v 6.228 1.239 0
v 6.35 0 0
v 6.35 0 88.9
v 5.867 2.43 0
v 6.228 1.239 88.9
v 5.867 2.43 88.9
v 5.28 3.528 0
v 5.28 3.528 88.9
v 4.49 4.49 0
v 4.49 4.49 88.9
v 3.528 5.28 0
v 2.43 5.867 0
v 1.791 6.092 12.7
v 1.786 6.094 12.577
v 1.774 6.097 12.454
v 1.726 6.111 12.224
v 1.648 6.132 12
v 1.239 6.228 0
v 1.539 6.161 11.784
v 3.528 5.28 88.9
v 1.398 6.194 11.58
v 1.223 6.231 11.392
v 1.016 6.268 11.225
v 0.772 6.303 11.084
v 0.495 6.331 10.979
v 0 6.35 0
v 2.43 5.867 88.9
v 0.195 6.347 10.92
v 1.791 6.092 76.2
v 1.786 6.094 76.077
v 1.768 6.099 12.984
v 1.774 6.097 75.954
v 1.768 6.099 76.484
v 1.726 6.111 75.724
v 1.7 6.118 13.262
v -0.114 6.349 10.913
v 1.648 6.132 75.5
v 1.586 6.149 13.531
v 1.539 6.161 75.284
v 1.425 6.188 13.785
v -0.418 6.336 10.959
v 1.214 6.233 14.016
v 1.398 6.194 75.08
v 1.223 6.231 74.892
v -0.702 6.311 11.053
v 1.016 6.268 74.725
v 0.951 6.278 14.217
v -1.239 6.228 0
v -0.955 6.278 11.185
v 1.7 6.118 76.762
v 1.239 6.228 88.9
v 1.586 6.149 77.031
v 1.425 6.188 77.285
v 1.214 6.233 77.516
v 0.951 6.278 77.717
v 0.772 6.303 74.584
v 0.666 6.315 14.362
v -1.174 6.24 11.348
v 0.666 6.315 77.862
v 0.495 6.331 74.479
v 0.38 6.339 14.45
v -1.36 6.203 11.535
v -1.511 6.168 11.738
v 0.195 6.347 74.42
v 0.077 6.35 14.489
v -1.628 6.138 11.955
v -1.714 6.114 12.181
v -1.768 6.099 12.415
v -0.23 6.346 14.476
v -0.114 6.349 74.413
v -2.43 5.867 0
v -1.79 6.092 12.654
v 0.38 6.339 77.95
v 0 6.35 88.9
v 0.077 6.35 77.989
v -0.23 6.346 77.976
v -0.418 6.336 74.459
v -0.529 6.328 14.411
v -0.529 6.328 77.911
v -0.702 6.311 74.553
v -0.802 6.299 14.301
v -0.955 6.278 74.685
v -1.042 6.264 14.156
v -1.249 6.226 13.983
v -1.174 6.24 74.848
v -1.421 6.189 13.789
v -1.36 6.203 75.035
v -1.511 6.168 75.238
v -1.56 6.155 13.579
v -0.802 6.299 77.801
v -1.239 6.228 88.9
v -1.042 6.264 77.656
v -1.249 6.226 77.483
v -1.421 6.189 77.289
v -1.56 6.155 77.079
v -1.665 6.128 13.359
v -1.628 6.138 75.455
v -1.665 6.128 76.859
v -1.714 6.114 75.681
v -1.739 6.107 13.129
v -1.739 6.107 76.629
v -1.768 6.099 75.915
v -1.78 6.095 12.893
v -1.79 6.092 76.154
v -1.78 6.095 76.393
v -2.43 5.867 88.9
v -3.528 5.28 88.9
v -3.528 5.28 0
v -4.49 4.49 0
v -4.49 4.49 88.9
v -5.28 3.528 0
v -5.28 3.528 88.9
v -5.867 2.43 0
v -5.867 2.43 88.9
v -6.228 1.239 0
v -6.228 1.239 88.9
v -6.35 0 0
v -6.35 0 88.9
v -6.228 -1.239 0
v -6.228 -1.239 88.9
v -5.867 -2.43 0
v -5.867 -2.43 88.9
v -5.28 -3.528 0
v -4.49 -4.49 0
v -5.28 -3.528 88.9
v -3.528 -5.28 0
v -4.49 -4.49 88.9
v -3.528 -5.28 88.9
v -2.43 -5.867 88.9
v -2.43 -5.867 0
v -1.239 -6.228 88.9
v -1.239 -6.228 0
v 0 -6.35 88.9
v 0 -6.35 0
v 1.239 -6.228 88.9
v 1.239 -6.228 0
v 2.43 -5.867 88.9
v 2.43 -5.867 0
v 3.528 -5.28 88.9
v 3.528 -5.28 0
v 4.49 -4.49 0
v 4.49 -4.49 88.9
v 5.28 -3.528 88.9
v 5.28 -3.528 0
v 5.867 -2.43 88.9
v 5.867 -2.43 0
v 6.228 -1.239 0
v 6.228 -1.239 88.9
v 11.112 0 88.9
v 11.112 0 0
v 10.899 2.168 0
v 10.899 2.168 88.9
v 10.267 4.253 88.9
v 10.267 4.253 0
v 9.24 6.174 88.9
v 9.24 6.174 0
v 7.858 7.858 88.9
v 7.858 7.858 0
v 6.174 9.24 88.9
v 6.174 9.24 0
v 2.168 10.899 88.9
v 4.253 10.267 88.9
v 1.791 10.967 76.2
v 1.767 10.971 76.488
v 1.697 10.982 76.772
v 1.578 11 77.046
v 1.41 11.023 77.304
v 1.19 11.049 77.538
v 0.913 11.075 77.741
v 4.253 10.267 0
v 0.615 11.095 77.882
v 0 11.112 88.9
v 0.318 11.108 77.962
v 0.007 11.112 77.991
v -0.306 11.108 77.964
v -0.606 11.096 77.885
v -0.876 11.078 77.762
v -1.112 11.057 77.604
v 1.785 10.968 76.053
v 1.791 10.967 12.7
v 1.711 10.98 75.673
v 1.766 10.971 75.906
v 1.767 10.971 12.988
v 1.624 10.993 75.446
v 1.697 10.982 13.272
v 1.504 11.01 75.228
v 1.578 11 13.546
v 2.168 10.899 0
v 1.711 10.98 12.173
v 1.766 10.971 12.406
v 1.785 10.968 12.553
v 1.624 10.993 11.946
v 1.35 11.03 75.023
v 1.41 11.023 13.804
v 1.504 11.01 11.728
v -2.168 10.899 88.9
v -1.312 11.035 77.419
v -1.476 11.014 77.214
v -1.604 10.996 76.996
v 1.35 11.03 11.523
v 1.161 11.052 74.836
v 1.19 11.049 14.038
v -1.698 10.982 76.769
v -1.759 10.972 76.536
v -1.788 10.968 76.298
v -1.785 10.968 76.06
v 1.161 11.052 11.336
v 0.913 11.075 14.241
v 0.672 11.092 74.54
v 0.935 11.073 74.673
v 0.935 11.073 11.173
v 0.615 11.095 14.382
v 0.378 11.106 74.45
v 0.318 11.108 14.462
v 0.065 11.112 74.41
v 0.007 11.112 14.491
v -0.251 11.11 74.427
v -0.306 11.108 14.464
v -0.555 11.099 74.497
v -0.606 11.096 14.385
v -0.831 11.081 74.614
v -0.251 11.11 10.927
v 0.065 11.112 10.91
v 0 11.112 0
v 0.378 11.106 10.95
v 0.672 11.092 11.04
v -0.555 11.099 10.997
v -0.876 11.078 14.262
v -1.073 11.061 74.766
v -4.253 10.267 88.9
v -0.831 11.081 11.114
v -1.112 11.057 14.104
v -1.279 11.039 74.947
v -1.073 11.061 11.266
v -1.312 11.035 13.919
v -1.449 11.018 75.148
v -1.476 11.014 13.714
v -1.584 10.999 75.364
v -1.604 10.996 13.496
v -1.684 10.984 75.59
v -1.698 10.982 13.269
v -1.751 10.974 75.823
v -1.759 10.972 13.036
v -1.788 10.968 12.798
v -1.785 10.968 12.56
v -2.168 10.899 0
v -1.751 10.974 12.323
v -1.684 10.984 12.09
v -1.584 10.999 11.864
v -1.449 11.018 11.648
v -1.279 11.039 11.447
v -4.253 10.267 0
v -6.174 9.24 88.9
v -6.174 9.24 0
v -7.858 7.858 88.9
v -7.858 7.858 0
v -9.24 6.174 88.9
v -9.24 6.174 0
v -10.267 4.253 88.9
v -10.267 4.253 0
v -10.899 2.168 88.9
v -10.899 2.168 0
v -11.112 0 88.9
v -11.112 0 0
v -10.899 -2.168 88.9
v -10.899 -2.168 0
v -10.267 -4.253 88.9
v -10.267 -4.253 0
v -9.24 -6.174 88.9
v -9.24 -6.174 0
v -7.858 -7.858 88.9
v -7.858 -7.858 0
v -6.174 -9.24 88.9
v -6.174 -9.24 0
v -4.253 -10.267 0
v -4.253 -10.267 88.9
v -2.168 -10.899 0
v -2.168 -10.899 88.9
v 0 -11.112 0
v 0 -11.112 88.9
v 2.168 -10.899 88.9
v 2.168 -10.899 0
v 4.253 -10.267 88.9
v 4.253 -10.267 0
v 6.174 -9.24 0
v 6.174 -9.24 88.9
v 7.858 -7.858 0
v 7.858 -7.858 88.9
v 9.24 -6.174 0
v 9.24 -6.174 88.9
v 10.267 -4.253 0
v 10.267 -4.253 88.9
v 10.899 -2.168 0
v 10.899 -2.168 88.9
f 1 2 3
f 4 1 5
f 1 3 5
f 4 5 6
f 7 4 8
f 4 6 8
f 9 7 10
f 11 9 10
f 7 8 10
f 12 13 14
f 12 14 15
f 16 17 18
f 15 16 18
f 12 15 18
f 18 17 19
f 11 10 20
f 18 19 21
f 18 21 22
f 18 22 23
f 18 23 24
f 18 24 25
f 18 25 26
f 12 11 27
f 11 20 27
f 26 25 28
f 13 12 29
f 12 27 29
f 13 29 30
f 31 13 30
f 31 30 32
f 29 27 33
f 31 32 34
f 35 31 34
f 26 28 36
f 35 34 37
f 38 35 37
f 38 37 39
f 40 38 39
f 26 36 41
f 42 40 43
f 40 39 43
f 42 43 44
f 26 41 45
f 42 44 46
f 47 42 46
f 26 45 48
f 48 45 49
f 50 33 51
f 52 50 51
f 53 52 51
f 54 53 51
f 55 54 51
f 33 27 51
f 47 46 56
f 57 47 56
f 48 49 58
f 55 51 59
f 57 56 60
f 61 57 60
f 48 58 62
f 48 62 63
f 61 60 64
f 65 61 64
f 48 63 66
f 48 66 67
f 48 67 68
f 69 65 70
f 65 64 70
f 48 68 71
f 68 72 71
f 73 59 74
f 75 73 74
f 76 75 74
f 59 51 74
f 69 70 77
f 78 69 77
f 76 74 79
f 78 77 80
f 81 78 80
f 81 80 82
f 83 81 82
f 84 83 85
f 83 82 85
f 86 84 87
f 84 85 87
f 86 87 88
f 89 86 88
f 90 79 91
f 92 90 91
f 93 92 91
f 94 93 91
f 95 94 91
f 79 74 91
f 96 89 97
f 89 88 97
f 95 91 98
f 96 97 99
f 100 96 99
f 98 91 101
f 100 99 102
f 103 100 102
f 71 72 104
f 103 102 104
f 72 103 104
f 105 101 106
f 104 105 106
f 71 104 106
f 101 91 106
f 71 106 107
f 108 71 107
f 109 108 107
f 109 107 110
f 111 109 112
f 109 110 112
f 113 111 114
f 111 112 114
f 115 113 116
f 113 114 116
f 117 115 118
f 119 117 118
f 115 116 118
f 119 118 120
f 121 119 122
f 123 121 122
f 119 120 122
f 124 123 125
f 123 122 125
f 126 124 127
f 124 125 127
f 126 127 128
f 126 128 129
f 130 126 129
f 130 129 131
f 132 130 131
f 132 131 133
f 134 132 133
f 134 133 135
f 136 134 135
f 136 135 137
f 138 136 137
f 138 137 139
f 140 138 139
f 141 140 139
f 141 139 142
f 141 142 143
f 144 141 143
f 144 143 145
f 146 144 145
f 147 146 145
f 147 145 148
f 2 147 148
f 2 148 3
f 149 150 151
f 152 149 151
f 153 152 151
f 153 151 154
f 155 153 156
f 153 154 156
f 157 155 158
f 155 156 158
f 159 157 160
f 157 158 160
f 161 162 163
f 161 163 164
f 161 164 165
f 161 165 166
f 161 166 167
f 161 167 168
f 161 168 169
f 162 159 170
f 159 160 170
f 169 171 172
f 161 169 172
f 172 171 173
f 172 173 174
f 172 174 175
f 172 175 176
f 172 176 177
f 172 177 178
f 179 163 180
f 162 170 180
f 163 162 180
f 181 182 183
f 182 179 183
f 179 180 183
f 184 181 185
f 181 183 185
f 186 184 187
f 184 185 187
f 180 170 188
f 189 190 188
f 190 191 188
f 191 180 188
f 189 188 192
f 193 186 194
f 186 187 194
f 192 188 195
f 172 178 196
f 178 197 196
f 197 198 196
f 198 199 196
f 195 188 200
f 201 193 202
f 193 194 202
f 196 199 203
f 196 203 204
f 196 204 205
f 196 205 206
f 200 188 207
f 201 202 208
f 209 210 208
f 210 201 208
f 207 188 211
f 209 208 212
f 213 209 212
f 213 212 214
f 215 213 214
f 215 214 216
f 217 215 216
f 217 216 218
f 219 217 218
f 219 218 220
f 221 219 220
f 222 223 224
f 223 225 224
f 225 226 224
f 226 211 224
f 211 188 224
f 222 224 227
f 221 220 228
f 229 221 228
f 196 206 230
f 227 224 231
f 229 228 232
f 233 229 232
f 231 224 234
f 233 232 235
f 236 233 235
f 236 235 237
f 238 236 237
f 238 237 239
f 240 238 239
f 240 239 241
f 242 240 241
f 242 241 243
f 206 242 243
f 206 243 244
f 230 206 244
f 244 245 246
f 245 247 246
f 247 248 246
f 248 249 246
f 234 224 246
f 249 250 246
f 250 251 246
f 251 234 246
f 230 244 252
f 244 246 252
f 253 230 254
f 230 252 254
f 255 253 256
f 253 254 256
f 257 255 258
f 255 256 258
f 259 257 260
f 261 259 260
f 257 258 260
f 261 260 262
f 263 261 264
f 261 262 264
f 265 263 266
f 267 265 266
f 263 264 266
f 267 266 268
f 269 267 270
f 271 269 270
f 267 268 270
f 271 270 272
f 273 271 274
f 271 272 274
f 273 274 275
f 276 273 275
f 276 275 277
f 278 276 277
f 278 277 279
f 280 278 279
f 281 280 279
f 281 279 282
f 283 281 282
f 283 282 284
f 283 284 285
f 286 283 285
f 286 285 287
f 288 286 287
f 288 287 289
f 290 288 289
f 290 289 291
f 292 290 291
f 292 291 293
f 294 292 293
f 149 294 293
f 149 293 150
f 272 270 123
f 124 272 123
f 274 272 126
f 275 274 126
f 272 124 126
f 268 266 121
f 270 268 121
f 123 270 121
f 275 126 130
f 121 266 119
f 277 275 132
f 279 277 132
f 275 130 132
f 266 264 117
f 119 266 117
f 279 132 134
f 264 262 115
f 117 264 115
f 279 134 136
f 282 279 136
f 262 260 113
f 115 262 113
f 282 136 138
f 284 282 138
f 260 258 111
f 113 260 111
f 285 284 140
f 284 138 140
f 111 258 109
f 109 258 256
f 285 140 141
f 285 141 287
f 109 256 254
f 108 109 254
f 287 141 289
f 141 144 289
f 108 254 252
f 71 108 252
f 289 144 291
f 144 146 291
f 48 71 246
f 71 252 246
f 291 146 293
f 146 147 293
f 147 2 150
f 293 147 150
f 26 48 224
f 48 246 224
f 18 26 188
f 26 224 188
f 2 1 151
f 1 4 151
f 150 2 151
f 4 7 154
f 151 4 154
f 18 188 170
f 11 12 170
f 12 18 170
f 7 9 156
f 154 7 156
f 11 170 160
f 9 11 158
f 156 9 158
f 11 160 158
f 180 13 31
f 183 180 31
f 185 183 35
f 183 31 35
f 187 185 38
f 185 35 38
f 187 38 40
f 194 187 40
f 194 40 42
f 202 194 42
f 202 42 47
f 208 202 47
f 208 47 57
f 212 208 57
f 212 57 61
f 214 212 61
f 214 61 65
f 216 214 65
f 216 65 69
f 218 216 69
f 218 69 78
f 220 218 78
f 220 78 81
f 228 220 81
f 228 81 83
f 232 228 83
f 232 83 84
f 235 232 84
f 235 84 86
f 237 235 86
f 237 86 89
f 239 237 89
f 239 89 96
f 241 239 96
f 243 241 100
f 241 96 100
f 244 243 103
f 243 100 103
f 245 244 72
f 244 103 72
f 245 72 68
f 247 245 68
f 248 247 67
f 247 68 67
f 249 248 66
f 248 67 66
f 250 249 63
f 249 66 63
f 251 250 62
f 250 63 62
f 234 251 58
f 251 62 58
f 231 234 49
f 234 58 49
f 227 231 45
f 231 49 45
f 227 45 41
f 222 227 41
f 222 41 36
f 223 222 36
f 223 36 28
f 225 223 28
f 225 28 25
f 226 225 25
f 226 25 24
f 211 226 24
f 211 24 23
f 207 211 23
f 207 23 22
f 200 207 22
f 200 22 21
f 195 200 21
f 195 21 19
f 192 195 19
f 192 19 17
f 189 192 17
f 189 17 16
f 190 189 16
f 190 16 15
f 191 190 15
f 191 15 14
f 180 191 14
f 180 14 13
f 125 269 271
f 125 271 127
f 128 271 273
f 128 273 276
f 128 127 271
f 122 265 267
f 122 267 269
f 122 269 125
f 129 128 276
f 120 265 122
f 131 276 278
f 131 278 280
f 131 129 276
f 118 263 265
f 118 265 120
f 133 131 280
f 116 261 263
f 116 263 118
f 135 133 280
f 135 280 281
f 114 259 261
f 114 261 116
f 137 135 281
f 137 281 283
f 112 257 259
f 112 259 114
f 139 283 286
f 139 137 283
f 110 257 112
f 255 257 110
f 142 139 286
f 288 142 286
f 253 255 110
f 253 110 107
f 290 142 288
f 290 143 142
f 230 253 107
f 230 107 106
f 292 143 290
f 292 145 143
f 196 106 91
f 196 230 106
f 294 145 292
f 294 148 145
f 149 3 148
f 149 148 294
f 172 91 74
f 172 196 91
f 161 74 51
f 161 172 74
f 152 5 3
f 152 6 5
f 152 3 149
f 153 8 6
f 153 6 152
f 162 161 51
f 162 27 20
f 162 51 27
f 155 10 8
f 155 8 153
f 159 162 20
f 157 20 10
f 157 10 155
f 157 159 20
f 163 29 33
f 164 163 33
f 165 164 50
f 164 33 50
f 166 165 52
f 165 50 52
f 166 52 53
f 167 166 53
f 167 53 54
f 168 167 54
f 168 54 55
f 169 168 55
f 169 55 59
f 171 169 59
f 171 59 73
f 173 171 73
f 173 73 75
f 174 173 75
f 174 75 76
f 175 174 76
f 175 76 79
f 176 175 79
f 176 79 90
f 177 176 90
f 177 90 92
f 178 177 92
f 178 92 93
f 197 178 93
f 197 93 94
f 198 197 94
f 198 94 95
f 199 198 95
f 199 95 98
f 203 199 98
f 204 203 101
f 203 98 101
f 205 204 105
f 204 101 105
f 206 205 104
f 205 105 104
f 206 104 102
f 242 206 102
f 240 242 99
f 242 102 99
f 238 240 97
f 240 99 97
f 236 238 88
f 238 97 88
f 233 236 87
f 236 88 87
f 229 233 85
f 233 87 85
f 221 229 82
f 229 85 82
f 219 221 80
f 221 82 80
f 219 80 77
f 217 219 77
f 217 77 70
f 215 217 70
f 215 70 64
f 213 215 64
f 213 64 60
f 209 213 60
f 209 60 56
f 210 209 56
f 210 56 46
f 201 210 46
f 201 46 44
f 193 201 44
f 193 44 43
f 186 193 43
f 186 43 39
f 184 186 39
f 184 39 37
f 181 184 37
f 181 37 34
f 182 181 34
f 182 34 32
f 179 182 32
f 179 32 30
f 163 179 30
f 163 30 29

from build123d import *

# Parameters (mm, degrees)
F0_R     = 11.1125
F1_DEPTH = 88.9
F2_R     = 6.35
F3_DEPTH = 88.9
F4_R     = 1.7907
F5_DEPTH = 22.225


with BuildPart() as f1:
    # F0 (on Top) → F1 (new body)
    with BuildSketch(Plane.XY):
        Circle(F0_R)
    extrude(amount=F1_DEPTH)

    # F2 (on face) → F3 (cut)
    with BuildSketch(Plane.XY.offset(88.9)):
        Circle(F2_R)
    extrude(amount=-F3_DEPTH, mode=Mode.SUBTRACT)

    # F4 (on Front) → F5 (cut)
    with BuildSketch(Plane.XZ):
        with Locations((0, 12.7)):
            Circle(F4_R)
        with Locations((0, 76.2)):
            Circle(F4_R)
    extrude(amount=-F5_DEPTH, mode=Mode.SUBTRACT)


solid = f1.part
